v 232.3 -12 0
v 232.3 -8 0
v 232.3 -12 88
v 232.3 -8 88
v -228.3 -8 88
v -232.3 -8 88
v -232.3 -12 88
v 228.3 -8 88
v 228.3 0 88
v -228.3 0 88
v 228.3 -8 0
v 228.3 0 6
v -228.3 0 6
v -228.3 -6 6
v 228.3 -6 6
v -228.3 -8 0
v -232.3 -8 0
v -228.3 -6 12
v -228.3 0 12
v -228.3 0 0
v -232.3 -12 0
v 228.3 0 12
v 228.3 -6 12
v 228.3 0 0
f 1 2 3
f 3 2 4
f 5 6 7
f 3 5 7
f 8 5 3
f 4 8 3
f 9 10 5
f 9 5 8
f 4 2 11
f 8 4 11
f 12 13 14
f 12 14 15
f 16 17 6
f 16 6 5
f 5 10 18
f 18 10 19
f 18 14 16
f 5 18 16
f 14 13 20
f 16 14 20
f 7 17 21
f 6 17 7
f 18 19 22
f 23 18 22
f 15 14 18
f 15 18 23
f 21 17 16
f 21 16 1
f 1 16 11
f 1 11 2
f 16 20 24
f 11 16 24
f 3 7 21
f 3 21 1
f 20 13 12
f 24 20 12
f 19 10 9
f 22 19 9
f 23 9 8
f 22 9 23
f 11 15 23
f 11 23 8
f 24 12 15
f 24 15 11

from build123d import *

# Parameters (mm, degrees)
SKETCH059_W             = 464.6
SKETCH059_H             = 88
PAD022_DEPTH            = 12
SKETCH060_W             = 4
SKETCH060_H             = 88
POCKET036_DEPTH         = 8
SKETCH061_W             = 456.6
SKETCH061_H             = 6
POCKET037_DEPTH         = 6
BODY021_PLACEMENT_ANGLE = 90


with BuildPart() as part:
    # Sketch059 → Pad022 (new body)
    with BuildSketch(Plane.XY):
        with Locations((0, 44)):
            Rectangle(SKETCH059_W, SKETCH059_H)
    extrude(amount=PAD022_DEPTH)

    # Sketch060 (on Face5 of Pad022) → Pocket036 (cut)
    with BuildSketch(Plane(origin=(0, 0, 0), x_dir=(1, 0, 0), z_dir=(0, 0, -1))):
        with Locations((-230.3, -44)):
            Rectangle(SKETCH060_W, SKETCH060_H)
    pocket036 = extrude(amount=-POCKET036_DEPTH, mode=Mode.SUBTRACT)

    # Mirrored013: Pocket036 across Sketch060 V_Axis
    add(pocket036.mirror(Plane(origin=(0, 0, 0), x_dir=(0, 0, -1), z_dir=(1, 0, 0))), mode=Mode.SUBTRACT)

    # Sketch061 (on Face3 of Mirrored013) → Pocket037 (cut)
    with BuildSketch(Plane(origin=(0, 0, 0), x_dir=(1, 0, 0), z_dir=(0, 0, -1))):
        with Locations((0, -9)):
            Rectangle(SKETCH061_W, SKETCH061_H)
    extrude(amount=-POCKET037_DEPTH, mode=Mode.SUBTRACT)


with BuildPart() as part_1:
    # Body021 placement: moved
    add(part.part.rotate(Axis((0, 0, 0), (1, 0, 0)), BODY021_PLACEMENT_ANGLE))


solid = part_1.part
